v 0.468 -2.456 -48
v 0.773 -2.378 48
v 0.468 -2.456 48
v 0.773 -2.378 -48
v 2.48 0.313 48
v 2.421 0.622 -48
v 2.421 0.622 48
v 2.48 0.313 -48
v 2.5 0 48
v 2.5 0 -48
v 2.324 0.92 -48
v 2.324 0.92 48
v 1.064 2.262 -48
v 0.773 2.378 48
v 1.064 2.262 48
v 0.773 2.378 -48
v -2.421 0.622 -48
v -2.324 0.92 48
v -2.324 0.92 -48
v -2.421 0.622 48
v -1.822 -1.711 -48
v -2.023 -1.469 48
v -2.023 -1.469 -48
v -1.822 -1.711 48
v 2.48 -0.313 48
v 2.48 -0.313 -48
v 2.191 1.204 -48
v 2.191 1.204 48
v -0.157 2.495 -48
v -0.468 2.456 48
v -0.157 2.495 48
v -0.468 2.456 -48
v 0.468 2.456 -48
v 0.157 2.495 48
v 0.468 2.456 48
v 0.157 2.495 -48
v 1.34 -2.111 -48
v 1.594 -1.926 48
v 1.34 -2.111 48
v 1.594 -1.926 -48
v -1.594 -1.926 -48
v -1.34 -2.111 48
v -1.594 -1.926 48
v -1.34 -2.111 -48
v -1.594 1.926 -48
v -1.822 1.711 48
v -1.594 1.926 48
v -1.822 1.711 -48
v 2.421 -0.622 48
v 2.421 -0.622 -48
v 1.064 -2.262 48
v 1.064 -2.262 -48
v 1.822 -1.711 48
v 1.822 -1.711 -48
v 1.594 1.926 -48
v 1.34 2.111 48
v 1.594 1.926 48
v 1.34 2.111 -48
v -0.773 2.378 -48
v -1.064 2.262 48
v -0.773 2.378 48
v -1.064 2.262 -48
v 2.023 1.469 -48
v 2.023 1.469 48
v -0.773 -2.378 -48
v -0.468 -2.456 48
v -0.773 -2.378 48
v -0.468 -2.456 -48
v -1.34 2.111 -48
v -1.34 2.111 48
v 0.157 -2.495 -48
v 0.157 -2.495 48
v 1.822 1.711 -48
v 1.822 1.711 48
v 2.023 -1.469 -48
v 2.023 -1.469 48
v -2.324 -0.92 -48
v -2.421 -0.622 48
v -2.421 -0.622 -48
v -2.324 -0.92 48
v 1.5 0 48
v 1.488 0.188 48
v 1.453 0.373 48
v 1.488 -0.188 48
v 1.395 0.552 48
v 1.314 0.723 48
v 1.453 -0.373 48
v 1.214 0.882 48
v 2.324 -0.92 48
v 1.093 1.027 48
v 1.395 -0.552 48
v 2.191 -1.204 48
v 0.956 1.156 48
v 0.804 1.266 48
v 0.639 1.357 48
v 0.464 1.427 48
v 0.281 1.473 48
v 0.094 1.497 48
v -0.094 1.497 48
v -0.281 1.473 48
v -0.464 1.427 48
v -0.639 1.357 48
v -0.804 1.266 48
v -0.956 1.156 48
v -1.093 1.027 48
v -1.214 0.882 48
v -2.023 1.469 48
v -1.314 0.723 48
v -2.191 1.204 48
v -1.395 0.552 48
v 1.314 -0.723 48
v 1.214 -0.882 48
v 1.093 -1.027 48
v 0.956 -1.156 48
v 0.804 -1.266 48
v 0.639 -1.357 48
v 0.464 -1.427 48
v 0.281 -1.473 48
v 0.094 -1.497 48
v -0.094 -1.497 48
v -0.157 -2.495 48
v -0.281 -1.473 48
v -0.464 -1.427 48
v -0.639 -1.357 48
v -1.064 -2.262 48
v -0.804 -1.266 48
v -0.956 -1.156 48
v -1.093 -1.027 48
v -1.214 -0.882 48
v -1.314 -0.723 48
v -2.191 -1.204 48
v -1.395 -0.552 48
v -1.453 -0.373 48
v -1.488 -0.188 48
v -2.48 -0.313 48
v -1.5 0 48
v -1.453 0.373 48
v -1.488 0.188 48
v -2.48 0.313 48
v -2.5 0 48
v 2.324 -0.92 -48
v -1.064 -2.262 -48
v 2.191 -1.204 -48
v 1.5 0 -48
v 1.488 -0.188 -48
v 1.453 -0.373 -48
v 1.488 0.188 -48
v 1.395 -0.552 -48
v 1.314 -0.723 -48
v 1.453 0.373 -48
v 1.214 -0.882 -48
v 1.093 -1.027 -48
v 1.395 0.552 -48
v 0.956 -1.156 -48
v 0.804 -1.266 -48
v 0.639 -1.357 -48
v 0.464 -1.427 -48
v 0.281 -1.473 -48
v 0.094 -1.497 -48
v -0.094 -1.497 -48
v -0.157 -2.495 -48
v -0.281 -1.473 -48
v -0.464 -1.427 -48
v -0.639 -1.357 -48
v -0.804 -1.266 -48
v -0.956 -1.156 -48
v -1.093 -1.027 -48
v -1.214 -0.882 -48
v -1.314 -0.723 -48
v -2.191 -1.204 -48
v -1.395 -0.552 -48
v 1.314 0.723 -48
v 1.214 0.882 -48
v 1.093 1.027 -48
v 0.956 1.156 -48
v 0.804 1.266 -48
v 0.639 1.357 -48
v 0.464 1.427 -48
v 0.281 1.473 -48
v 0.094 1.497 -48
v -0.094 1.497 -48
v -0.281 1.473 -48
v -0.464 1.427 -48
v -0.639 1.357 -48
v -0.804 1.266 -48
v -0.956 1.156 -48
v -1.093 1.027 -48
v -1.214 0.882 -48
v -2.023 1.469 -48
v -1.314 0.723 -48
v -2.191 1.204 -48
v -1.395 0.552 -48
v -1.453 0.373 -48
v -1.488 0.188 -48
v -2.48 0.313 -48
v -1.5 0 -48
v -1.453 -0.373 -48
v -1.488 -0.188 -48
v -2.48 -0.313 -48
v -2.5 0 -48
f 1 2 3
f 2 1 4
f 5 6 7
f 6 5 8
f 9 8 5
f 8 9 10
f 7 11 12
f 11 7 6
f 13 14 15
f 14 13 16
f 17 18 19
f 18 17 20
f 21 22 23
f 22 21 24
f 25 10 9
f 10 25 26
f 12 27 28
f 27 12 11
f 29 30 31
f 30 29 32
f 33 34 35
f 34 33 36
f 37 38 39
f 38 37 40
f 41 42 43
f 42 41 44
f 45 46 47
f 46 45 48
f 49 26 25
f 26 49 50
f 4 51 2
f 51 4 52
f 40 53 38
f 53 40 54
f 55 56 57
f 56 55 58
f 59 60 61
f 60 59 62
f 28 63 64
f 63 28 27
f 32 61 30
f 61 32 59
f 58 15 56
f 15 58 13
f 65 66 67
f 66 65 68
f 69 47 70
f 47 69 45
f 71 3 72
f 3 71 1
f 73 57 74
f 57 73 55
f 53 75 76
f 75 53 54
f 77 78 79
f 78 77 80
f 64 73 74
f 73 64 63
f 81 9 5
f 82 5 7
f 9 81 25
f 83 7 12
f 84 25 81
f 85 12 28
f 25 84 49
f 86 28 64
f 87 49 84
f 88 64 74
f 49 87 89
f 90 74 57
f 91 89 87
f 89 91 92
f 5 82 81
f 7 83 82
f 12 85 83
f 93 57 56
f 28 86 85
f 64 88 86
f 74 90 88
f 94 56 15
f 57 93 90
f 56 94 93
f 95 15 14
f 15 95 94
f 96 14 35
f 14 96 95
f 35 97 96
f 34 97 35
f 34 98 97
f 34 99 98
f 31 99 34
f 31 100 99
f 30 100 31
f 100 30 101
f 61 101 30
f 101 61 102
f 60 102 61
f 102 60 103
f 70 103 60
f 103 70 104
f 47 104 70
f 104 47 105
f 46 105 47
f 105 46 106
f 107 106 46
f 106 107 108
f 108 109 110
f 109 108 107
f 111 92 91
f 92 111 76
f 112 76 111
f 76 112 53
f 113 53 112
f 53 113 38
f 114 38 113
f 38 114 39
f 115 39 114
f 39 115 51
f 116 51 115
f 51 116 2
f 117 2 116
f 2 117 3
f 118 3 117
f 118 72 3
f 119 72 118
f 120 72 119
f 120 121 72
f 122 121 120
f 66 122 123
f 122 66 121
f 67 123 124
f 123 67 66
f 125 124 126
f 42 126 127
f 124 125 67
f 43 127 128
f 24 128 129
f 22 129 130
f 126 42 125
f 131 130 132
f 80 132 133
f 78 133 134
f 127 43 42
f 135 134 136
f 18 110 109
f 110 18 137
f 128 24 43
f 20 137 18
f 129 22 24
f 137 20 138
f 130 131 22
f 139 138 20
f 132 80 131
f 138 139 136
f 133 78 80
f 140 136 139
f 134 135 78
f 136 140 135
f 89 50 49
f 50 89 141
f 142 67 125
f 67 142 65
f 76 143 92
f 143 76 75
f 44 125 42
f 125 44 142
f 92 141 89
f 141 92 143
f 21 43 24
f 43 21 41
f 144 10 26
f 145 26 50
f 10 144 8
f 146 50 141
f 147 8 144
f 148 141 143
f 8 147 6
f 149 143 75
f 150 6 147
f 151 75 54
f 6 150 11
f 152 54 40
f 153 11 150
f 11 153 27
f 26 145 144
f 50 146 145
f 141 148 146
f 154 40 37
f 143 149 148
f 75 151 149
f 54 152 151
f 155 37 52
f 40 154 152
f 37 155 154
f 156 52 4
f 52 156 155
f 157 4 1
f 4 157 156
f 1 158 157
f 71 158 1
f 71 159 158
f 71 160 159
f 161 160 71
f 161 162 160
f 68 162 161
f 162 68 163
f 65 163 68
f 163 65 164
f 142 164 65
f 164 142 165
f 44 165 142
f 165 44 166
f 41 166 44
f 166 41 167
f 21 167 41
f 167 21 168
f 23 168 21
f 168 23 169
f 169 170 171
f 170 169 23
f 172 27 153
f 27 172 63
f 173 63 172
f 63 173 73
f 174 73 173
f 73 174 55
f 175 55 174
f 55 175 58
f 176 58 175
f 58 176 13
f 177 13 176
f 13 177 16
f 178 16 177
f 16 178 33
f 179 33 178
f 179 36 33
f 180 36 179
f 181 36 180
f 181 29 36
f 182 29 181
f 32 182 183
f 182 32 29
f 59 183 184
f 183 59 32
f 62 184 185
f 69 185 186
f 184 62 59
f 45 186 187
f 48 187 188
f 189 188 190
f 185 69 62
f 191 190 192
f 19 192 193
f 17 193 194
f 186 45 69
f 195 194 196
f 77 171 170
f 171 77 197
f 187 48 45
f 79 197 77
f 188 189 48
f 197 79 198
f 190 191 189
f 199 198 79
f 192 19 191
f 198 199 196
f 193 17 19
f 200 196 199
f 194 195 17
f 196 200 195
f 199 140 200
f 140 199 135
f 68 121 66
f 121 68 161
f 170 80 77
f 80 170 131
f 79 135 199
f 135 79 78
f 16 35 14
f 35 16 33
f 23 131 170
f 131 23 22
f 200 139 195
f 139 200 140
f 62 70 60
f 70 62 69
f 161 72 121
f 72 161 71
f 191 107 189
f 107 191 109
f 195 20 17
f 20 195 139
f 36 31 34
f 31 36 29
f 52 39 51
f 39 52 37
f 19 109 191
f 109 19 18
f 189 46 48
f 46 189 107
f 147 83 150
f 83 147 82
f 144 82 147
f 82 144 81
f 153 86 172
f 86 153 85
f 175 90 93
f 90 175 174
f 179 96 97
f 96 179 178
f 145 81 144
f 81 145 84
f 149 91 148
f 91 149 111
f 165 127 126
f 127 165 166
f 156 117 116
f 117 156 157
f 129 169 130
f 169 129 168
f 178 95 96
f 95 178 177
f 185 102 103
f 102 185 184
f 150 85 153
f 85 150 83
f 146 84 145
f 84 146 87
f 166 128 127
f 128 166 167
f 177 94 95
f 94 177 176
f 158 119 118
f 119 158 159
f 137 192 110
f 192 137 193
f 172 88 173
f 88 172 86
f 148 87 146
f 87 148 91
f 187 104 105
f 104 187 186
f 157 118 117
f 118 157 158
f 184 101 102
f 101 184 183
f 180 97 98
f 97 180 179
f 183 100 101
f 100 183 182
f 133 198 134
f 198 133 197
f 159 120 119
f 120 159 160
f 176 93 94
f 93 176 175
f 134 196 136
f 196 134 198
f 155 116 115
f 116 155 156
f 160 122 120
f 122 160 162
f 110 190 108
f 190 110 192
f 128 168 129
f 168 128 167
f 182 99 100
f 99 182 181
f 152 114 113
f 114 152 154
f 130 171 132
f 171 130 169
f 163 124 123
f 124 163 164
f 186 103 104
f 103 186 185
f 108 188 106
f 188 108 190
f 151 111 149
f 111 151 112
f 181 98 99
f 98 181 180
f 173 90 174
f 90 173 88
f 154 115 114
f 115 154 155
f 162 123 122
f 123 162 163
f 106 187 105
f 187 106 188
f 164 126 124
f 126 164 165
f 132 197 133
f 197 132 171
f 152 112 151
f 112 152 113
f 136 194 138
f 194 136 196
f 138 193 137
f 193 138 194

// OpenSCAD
$fn = 50;


difference() {
	union() {
		translate(v = [0, 0, -48.0000000000]) {
			cylinder(h = 96, r = 2.5000000000);
		}
	}
	union() {
		translate(v = [0, 0, -100.0000000000]) {
			cylinder(h = 200, r = 1.5000000000);
		}
	}
}
